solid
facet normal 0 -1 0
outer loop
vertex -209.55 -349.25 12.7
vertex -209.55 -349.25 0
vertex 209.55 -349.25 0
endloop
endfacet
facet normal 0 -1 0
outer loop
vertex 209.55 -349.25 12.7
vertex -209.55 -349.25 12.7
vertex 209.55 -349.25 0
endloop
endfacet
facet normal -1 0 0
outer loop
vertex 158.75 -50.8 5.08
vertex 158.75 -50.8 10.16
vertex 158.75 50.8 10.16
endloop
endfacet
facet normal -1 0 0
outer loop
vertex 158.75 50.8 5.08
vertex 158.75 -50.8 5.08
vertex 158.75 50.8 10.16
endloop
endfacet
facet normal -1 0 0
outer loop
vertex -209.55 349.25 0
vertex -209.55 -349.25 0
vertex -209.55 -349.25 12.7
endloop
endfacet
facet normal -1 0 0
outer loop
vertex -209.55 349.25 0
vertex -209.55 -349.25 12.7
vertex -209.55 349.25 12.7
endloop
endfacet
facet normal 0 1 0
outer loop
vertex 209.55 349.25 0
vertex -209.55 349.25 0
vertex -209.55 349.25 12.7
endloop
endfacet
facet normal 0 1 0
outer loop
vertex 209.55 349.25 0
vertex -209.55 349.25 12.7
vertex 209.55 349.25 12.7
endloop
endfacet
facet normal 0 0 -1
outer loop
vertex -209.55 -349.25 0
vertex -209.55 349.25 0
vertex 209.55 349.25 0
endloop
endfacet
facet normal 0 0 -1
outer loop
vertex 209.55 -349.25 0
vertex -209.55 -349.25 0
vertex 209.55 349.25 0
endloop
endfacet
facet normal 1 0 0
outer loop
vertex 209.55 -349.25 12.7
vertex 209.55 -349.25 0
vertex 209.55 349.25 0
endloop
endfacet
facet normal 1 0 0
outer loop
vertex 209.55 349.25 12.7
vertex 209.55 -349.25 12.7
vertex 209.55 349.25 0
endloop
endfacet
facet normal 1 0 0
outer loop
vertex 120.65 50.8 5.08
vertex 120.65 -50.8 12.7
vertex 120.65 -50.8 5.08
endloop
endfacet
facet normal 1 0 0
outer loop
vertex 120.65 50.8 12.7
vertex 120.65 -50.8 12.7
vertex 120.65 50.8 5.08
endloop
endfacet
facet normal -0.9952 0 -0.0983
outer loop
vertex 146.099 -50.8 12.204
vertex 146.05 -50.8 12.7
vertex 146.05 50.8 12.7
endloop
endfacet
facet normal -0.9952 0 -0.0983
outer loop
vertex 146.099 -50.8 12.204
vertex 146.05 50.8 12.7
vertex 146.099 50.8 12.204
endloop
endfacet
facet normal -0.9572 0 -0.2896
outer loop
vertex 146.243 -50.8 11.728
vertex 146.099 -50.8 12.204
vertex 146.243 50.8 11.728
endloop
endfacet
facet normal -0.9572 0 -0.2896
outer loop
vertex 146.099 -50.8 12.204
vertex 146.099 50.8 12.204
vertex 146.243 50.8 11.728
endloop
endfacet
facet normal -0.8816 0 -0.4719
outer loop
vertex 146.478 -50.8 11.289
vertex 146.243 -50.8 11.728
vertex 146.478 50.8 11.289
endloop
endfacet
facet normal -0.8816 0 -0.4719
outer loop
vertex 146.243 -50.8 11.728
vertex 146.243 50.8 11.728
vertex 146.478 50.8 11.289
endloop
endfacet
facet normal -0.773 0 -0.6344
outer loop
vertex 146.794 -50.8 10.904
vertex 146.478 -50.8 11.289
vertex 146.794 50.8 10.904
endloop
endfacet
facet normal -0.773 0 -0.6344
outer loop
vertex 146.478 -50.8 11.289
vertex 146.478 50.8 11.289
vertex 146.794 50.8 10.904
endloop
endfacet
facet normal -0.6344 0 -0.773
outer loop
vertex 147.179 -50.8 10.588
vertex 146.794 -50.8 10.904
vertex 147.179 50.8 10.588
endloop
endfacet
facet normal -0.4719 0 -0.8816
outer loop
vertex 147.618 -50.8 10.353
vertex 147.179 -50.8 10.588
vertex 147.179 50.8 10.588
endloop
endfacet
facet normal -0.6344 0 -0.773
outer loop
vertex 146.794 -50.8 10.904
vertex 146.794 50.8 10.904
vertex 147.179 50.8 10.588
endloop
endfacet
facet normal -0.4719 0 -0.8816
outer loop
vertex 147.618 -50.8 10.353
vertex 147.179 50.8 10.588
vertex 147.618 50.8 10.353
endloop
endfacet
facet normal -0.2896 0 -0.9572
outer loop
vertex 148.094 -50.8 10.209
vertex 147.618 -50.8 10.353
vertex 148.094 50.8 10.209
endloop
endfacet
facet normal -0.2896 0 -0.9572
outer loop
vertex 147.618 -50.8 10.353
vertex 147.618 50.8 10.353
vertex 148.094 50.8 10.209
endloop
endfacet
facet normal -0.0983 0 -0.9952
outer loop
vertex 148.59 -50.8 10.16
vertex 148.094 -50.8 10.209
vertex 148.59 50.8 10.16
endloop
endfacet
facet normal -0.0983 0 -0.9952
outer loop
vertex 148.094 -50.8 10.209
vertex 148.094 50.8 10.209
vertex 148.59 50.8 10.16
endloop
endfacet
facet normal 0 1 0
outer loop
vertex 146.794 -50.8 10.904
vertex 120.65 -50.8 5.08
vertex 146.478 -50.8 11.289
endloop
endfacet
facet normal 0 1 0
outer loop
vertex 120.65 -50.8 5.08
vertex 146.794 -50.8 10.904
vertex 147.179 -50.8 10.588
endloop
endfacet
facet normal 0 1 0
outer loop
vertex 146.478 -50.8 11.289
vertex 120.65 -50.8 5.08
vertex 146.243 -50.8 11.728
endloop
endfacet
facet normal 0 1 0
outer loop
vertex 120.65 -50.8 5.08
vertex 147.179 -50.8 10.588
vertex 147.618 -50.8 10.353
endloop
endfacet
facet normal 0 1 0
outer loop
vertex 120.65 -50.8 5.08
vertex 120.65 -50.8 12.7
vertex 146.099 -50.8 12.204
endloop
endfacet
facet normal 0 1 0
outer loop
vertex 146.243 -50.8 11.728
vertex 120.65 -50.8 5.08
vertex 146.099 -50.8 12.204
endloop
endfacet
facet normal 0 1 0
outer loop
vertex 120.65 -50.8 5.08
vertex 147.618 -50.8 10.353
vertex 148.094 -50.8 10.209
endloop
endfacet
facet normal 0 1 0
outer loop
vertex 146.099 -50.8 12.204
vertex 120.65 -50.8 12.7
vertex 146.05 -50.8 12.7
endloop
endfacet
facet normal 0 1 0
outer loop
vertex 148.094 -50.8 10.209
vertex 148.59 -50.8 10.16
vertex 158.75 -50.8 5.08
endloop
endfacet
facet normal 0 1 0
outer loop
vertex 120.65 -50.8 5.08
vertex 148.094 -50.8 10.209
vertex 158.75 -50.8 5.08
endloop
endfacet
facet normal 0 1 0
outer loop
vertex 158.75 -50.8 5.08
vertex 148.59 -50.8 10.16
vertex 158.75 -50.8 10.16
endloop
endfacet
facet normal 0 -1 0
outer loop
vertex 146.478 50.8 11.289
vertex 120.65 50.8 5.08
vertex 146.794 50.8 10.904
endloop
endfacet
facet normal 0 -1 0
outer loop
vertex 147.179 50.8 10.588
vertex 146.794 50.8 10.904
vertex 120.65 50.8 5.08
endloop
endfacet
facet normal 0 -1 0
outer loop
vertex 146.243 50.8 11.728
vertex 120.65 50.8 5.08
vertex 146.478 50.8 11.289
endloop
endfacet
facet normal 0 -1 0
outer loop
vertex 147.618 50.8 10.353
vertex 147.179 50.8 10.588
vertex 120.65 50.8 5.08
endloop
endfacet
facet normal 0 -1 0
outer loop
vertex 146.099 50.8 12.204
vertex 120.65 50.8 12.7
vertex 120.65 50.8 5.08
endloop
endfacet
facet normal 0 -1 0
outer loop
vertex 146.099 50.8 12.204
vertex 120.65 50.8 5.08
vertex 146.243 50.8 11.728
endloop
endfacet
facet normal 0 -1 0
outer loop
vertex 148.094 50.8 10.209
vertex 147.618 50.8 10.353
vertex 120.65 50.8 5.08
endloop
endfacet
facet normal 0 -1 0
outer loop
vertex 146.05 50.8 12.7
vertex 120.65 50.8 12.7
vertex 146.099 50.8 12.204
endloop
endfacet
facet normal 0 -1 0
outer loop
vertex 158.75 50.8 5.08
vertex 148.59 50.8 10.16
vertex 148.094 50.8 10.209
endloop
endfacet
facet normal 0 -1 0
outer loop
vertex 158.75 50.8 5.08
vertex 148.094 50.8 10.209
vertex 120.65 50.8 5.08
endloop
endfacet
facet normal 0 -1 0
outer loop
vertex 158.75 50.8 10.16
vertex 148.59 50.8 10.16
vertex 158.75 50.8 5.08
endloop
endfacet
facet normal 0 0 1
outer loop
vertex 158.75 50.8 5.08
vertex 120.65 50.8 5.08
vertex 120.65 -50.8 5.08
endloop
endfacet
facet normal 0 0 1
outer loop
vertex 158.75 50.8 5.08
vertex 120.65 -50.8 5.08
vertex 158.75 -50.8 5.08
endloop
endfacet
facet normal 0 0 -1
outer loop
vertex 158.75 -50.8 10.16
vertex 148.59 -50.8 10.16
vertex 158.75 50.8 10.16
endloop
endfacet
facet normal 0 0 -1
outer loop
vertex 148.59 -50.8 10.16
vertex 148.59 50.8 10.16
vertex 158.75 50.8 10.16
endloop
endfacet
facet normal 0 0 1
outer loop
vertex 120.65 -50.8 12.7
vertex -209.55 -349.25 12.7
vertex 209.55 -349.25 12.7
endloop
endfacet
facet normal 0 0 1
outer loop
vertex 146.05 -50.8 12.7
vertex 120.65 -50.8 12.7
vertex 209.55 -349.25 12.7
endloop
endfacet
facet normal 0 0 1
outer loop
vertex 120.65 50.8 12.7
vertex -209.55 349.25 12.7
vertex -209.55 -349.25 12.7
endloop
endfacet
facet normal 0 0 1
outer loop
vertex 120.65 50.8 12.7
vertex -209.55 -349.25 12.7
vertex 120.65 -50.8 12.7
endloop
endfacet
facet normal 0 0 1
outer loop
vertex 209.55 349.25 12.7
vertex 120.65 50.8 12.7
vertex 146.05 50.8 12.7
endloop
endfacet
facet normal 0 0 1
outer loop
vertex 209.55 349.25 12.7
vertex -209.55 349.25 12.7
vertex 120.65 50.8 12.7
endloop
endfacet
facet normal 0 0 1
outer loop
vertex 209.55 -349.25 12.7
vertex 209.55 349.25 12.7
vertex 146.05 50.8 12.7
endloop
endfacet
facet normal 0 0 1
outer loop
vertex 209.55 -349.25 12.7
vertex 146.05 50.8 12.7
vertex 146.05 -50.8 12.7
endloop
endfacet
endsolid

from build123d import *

# Parameters (mm, degrees)
SKETCH1_W           = 419.1
SKETCH1_H           = 698.5
BOSS_EXTRUDE1_DEPTH = 12.7
SKETCH2_W           = 38.1
SKETCH2_H           = 101.6
CUT_EXTRUDE1_DEPTH  = 7.62
SKETCH3_W           = 12.7
SKETCH3_H           = 101.6
BOSS_EXTRUDE2_DEPTH = 2.54
FILLET1_R           = 2.54


with BuildPart() as part:
    # Sketch1 → Boss-Extrude1 (new body)
    with BuildSketch(Plane.XY):
        Rectangle(SKETCH1_W, SKETCH1_H)
    extrude(amount=BOSS_EXTRUDE1_DEPTH)

    # Sketch2 → Cut-Extrude1 (cut)
    with BuildSketch(Plane.XY.offset(12.7)):
        with Locations((139.7, 0)):
            Rectangle(SKETCH2_W, SKETCH2_H)
    extrude(amount=-CUT_EXTRUDE1_DEPTH, mode=Mode.SUBTRACT)

    # Sketch3 → Boss-Extrude2 (add)
    with BuildSketch(Plane.XY.offset(12.7)):
        with Locations((152.4, 0)):
            Rectangle(SKETCH3_W, SKETCH3_H)
    extrude(amount=-BOSS_EXTRUDE2_DEPTH)

    # Fillet1
    fillet1_edges = [part.edges().sort_by_distance(p)[0] for p in [
        (146.05, 0, 10.16),
    ]]
    fillet(fillet1_edges, radius=FILLET1_R - 0.0001)  # a hair under: the kernel refuses the full size


solid = part.part
